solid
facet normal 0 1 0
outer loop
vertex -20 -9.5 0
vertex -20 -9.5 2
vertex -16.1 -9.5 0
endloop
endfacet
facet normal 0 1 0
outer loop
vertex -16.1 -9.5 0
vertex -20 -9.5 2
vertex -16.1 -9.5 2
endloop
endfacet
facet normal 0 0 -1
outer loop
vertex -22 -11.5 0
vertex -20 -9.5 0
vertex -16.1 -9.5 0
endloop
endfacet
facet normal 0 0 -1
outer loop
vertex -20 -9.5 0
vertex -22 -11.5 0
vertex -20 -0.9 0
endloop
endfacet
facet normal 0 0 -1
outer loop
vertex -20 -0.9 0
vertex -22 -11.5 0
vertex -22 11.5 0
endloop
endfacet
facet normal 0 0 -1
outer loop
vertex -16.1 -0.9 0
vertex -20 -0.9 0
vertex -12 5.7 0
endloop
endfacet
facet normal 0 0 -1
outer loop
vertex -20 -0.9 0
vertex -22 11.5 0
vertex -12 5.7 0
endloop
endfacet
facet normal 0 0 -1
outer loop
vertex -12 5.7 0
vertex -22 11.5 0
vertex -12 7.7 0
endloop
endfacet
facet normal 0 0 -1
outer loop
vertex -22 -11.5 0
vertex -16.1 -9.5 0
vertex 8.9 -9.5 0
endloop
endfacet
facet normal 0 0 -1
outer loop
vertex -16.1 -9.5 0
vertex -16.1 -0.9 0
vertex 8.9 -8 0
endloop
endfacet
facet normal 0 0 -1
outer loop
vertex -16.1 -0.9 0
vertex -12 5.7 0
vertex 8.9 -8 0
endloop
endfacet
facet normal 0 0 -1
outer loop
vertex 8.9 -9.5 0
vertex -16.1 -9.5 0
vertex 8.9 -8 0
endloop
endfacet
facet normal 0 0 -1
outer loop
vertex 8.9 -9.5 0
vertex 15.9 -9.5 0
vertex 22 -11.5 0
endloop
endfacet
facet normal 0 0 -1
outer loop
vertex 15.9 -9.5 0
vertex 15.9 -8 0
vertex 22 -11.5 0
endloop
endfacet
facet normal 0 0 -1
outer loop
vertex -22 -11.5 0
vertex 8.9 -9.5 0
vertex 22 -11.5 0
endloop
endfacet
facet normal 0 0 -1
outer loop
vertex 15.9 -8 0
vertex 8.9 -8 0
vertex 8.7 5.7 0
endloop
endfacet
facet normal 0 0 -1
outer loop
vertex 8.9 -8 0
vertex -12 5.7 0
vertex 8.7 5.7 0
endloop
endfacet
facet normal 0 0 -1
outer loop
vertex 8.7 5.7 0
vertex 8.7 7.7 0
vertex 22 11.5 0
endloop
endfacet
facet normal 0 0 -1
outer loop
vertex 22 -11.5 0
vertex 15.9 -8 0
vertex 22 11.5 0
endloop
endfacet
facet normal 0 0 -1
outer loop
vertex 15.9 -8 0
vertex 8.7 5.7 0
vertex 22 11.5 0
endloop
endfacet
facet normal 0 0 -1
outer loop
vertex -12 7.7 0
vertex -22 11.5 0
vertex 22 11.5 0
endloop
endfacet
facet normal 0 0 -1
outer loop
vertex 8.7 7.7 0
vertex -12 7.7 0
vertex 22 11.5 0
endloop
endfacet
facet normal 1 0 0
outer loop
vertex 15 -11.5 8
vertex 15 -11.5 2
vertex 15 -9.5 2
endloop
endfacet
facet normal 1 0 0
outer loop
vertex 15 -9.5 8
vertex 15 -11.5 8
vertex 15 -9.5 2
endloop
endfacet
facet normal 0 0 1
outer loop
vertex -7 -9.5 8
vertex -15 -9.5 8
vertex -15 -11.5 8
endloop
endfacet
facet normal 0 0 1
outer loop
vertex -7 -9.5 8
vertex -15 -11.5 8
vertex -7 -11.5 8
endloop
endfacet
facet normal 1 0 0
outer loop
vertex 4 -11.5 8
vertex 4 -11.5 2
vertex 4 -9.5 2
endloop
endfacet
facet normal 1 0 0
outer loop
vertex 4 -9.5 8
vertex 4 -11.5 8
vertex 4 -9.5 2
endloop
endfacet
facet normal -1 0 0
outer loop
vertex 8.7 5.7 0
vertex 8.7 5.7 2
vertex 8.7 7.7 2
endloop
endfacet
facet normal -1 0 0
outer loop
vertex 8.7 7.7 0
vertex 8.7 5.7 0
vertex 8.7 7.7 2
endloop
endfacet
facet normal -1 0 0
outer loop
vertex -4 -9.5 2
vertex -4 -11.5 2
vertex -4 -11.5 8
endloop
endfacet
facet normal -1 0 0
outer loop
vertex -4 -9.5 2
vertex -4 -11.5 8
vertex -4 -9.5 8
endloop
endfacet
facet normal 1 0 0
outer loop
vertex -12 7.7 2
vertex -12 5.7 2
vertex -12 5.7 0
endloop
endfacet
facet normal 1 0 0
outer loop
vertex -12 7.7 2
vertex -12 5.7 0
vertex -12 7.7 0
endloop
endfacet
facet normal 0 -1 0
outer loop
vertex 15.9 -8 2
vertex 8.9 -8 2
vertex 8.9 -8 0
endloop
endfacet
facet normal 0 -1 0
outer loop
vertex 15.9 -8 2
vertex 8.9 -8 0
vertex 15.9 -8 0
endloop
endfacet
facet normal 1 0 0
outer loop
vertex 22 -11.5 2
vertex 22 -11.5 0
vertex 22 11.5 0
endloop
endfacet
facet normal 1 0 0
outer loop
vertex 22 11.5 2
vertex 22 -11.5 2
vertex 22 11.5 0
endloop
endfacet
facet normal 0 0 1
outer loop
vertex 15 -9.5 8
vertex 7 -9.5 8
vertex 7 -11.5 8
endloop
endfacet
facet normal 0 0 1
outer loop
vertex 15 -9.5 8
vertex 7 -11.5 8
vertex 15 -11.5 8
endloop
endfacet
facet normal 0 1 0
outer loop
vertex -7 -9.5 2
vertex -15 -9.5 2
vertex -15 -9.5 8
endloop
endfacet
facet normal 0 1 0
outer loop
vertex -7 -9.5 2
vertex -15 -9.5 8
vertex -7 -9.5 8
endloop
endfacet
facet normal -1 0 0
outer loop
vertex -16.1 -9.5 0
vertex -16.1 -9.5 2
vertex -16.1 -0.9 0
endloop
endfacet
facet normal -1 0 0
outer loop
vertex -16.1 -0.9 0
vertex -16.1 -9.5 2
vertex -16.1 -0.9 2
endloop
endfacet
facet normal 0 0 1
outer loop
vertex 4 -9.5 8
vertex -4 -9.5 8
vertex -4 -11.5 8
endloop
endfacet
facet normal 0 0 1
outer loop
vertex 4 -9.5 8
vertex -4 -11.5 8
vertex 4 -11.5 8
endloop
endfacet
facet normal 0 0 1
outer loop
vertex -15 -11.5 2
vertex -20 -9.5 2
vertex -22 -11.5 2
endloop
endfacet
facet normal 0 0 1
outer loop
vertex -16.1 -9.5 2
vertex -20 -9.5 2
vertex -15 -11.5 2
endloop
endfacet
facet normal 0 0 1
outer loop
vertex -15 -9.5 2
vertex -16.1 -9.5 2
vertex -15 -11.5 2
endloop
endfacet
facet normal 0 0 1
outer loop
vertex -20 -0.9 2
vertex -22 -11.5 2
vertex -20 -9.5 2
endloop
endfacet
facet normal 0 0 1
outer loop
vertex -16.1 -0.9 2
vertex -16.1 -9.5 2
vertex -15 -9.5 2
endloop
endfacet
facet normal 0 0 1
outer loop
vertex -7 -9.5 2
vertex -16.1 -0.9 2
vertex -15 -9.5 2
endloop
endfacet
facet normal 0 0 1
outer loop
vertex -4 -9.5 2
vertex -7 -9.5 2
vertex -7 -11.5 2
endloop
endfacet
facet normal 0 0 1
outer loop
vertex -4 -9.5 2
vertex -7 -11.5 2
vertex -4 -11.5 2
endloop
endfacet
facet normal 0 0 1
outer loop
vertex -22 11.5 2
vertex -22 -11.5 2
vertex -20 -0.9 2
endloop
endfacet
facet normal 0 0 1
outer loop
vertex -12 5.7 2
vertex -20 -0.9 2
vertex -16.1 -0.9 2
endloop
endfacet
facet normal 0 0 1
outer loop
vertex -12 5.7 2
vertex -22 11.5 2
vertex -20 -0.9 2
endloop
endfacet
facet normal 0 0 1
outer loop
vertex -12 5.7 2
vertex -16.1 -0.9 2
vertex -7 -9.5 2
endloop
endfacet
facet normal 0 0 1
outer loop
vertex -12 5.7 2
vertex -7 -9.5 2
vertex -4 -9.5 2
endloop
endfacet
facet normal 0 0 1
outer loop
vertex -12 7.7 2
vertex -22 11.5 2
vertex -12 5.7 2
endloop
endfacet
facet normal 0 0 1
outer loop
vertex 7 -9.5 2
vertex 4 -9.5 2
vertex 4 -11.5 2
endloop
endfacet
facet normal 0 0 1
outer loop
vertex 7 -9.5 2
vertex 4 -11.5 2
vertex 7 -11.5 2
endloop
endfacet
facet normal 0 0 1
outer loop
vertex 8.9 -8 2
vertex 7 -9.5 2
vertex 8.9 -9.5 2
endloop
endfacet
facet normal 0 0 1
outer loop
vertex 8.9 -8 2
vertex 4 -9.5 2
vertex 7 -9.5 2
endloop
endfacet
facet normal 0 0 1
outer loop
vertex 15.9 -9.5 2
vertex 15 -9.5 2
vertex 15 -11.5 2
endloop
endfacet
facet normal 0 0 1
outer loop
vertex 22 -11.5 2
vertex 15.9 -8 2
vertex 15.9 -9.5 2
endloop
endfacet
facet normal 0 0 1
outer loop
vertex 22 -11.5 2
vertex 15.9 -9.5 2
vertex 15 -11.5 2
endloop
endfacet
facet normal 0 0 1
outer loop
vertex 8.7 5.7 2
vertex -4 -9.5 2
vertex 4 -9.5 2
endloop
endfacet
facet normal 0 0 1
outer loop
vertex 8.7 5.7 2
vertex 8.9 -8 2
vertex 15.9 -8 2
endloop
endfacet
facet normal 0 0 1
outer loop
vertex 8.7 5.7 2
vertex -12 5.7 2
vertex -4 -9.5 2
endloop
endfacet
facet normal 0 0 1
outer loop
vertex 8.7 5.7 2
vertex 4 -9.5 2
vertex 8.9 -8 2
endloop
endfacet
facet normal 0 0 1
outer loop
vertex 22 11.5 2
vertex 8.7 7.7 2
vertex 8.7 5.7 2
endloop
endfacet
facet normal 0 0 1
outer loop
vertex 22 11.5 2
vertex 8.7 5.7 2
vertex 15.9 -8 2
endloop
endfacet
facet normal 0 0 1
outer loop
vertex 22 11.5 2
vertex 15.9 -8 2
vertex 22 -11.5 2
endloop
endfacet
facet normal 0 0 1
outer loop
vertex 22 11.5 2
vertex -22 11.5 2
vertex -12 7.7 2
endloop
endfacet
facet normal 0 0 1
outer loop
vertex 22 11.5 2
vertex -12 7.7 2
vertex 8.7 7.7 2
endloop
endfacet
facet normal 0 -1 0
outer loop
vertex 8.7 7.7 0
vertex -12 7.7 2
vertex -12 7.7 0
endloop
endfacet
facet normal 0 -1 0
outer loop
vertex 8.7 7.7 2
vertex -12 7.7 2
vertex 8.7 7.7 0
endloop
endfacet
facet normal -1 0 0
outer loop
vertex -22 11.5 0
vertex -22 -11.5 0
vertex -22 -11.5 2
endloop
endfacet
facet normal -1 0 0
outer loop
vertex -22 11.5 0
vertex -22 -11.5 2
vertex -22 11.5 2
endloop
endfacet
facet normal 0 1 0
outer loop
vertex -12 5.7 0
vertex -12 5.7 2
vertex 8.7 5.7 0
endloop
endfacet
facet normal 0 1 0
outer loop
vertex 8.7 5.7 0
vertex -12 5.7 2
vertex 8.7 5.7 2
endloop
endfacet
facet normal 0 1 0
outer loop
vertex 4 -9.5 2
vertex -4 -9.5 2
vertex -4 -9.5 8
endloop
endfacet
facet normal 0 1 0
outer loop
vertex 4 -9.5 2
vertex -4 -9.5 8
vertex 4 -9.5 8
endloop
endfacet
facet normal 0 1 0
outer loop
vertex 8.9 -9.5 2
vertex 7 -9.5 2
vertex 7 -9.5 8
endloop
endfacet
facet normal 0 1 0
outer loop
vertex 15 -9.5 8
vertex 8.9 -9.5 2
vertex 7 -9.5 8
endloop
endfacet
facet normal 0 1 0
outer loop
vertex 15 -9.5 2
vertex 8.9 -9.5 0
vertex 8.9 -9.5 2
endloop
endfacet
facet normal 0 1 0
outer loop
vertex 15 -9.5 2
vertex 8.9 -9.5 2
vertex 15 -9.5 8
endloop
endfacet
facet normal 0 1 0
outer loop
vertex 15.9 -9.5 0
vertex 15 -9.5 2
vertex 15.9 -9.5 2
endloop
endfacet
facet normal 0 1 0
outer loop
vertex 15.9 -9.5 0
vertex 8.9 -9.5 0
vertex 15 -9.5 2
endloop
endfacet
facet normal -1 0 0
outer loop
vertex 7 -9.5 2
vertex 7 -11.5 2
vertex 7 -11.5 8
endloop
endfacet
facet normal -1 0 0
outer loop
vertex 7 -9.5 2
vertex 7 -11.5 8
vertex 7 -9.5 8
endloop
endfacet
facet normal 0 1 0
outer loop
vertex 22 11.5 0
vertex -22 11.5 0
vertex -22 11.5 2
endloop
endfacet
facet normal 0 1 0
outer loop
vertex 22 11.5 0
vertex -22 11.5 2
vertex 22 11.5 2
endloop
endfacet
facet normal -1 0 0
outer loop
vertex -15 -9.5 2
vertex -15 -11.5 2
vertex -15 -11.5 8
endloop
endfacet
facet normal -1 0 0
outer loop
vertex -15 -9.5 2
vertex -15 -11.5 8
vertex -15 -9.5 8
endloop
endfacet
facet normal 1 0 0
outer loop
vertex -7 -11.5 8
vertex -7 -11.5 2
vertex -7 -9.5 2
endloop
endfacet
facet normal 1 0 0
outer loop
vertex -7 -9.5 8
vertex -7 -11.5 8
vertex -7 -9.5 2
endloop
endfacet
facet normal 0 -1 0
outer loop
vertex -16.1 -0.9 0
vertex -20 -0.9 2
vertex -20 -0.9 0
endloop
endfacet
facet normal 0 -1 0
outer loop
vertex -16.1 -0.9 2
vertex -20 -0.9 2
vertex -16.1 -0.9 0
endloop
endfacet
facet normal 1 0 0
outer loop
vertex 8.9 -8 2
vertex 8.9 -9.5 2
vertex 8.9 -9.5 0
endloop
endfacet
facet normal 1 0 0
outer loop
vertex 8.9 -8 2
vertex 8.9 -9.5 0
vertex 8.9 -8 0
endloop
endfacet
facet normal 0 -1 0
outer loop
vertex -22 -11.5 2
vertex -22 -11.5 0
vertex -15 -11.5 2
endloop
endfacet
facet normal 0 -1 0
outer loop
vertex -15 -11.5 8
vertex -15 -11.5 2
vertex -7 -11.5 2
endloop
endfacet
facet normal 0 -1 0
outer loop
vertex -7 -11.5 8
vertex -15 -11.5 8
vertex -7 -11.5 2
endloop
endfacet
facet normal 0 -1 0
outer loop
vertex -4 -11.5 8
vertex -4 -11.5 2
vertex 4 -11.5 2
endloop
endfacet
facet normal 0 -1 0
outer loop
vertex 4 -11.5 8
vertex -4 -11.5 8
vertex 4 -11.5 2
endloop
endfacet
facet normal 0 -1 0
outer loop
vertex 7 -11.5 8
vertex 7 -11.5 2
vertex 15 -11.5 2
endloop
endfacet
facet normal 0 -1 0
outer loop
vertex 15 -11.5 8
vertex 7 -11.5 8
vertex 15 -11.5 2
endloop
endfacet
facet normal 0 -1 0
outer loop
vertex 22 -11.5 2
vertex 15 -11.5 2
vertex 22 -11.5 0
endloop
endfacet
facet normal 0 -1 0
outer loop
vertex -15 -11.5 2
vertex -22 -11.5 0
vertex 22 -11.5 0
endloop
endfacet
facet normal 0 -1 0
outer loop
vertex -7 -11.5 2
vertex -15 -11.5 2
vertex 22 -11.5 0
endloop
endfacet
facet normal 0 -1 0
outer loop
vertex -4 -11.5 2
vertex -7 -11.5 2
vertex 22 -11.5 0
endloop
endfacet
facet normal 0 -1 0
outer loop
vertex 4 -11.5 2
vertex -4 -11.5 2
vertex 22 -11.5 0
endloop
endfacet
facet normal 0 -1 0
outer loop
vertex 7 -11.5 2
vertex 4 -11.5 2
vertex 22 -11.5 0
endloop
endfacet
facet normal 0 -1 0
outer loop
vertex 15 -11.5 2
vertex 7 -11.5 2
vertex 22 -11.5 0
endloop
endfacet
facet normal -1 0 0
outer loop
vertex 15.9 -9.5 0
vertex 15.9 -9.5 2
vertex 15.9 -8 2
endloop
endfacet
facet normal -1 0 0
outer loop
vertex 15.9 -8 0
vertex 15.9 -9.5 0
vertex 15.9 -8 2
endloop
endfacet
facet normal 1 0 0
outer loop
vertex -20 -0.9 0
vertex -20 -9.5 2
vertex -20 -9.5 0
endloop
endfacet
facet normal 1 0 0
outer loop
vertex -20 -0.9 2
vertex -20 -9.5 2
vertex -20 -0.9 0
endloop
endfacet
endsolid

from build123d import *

# Parameters (mm, degrees)
SKETCH1_W           = 44
SKETCH1_H           = 23
BOSS_EXTRUDE1_DEPTH = 2
SKETCH2_W           = 3.9
SKETCH2_H           = 8.6
SKETCH2_W_2         = 7
SKETCH2_H_2         = 1.5
SKETCH2_W_3         = 20.7
SKETCH2_H_3         = 2
CUT_EXTRUDE1_DEPTH  = 2
SKETCH4_W           = 8
SKETCH4_H           = 2
BOSS_EXTRUDE2_DEPTH = 6


with BuildPart() as part:
    # Sketch1 → Boss-Extrude1 (new body)
    with BuildSketch(Plane.XY):
        Rectangle(SKETCH1_W, SKETCH1_H)
    extrude(amount=BOSS_EXTRUDE1_DEPTH)

    # Sketch2 → Cut-Extrude1 (cut)
    with BuildSketch(Plane.XY.offset(2)):
        with Locations((-18.05, -5.2)):
            Rectangle(SKETCH2_W, SKETCH2_H)
        with Locations((12.4, -8.75)):
            Rectangle(SKETCH2_W_2, SKETCH2_H_2)
        with Locations((-1.65, 6.7)):
            Rectangle(SKETCH2_W_3, SKETCH2_H_3)
    extrude(amount=-CUT_EXTRUDE1_DEPTH, mode=Mode.SUBTRACT)

    # Sketch4 → Boss-Extrude2 (add)
    with BuildSketch(Plane.XY.offset(2)):
        with Locations((-11, -10.5)):
            Rectangle(SKETCH4_W, SKETCH4_H)
        with Locations((0, -10.5)):
            Rectangle(SKETCH4_W, SKETCH4_H)
        with Locations((11, -10.5)):
            Rectangle(SKETCH4_W, SKETCH4_H)
    extrude(amount=BOSS_EXTRUDE2_DEPTH)


solid = part.part
